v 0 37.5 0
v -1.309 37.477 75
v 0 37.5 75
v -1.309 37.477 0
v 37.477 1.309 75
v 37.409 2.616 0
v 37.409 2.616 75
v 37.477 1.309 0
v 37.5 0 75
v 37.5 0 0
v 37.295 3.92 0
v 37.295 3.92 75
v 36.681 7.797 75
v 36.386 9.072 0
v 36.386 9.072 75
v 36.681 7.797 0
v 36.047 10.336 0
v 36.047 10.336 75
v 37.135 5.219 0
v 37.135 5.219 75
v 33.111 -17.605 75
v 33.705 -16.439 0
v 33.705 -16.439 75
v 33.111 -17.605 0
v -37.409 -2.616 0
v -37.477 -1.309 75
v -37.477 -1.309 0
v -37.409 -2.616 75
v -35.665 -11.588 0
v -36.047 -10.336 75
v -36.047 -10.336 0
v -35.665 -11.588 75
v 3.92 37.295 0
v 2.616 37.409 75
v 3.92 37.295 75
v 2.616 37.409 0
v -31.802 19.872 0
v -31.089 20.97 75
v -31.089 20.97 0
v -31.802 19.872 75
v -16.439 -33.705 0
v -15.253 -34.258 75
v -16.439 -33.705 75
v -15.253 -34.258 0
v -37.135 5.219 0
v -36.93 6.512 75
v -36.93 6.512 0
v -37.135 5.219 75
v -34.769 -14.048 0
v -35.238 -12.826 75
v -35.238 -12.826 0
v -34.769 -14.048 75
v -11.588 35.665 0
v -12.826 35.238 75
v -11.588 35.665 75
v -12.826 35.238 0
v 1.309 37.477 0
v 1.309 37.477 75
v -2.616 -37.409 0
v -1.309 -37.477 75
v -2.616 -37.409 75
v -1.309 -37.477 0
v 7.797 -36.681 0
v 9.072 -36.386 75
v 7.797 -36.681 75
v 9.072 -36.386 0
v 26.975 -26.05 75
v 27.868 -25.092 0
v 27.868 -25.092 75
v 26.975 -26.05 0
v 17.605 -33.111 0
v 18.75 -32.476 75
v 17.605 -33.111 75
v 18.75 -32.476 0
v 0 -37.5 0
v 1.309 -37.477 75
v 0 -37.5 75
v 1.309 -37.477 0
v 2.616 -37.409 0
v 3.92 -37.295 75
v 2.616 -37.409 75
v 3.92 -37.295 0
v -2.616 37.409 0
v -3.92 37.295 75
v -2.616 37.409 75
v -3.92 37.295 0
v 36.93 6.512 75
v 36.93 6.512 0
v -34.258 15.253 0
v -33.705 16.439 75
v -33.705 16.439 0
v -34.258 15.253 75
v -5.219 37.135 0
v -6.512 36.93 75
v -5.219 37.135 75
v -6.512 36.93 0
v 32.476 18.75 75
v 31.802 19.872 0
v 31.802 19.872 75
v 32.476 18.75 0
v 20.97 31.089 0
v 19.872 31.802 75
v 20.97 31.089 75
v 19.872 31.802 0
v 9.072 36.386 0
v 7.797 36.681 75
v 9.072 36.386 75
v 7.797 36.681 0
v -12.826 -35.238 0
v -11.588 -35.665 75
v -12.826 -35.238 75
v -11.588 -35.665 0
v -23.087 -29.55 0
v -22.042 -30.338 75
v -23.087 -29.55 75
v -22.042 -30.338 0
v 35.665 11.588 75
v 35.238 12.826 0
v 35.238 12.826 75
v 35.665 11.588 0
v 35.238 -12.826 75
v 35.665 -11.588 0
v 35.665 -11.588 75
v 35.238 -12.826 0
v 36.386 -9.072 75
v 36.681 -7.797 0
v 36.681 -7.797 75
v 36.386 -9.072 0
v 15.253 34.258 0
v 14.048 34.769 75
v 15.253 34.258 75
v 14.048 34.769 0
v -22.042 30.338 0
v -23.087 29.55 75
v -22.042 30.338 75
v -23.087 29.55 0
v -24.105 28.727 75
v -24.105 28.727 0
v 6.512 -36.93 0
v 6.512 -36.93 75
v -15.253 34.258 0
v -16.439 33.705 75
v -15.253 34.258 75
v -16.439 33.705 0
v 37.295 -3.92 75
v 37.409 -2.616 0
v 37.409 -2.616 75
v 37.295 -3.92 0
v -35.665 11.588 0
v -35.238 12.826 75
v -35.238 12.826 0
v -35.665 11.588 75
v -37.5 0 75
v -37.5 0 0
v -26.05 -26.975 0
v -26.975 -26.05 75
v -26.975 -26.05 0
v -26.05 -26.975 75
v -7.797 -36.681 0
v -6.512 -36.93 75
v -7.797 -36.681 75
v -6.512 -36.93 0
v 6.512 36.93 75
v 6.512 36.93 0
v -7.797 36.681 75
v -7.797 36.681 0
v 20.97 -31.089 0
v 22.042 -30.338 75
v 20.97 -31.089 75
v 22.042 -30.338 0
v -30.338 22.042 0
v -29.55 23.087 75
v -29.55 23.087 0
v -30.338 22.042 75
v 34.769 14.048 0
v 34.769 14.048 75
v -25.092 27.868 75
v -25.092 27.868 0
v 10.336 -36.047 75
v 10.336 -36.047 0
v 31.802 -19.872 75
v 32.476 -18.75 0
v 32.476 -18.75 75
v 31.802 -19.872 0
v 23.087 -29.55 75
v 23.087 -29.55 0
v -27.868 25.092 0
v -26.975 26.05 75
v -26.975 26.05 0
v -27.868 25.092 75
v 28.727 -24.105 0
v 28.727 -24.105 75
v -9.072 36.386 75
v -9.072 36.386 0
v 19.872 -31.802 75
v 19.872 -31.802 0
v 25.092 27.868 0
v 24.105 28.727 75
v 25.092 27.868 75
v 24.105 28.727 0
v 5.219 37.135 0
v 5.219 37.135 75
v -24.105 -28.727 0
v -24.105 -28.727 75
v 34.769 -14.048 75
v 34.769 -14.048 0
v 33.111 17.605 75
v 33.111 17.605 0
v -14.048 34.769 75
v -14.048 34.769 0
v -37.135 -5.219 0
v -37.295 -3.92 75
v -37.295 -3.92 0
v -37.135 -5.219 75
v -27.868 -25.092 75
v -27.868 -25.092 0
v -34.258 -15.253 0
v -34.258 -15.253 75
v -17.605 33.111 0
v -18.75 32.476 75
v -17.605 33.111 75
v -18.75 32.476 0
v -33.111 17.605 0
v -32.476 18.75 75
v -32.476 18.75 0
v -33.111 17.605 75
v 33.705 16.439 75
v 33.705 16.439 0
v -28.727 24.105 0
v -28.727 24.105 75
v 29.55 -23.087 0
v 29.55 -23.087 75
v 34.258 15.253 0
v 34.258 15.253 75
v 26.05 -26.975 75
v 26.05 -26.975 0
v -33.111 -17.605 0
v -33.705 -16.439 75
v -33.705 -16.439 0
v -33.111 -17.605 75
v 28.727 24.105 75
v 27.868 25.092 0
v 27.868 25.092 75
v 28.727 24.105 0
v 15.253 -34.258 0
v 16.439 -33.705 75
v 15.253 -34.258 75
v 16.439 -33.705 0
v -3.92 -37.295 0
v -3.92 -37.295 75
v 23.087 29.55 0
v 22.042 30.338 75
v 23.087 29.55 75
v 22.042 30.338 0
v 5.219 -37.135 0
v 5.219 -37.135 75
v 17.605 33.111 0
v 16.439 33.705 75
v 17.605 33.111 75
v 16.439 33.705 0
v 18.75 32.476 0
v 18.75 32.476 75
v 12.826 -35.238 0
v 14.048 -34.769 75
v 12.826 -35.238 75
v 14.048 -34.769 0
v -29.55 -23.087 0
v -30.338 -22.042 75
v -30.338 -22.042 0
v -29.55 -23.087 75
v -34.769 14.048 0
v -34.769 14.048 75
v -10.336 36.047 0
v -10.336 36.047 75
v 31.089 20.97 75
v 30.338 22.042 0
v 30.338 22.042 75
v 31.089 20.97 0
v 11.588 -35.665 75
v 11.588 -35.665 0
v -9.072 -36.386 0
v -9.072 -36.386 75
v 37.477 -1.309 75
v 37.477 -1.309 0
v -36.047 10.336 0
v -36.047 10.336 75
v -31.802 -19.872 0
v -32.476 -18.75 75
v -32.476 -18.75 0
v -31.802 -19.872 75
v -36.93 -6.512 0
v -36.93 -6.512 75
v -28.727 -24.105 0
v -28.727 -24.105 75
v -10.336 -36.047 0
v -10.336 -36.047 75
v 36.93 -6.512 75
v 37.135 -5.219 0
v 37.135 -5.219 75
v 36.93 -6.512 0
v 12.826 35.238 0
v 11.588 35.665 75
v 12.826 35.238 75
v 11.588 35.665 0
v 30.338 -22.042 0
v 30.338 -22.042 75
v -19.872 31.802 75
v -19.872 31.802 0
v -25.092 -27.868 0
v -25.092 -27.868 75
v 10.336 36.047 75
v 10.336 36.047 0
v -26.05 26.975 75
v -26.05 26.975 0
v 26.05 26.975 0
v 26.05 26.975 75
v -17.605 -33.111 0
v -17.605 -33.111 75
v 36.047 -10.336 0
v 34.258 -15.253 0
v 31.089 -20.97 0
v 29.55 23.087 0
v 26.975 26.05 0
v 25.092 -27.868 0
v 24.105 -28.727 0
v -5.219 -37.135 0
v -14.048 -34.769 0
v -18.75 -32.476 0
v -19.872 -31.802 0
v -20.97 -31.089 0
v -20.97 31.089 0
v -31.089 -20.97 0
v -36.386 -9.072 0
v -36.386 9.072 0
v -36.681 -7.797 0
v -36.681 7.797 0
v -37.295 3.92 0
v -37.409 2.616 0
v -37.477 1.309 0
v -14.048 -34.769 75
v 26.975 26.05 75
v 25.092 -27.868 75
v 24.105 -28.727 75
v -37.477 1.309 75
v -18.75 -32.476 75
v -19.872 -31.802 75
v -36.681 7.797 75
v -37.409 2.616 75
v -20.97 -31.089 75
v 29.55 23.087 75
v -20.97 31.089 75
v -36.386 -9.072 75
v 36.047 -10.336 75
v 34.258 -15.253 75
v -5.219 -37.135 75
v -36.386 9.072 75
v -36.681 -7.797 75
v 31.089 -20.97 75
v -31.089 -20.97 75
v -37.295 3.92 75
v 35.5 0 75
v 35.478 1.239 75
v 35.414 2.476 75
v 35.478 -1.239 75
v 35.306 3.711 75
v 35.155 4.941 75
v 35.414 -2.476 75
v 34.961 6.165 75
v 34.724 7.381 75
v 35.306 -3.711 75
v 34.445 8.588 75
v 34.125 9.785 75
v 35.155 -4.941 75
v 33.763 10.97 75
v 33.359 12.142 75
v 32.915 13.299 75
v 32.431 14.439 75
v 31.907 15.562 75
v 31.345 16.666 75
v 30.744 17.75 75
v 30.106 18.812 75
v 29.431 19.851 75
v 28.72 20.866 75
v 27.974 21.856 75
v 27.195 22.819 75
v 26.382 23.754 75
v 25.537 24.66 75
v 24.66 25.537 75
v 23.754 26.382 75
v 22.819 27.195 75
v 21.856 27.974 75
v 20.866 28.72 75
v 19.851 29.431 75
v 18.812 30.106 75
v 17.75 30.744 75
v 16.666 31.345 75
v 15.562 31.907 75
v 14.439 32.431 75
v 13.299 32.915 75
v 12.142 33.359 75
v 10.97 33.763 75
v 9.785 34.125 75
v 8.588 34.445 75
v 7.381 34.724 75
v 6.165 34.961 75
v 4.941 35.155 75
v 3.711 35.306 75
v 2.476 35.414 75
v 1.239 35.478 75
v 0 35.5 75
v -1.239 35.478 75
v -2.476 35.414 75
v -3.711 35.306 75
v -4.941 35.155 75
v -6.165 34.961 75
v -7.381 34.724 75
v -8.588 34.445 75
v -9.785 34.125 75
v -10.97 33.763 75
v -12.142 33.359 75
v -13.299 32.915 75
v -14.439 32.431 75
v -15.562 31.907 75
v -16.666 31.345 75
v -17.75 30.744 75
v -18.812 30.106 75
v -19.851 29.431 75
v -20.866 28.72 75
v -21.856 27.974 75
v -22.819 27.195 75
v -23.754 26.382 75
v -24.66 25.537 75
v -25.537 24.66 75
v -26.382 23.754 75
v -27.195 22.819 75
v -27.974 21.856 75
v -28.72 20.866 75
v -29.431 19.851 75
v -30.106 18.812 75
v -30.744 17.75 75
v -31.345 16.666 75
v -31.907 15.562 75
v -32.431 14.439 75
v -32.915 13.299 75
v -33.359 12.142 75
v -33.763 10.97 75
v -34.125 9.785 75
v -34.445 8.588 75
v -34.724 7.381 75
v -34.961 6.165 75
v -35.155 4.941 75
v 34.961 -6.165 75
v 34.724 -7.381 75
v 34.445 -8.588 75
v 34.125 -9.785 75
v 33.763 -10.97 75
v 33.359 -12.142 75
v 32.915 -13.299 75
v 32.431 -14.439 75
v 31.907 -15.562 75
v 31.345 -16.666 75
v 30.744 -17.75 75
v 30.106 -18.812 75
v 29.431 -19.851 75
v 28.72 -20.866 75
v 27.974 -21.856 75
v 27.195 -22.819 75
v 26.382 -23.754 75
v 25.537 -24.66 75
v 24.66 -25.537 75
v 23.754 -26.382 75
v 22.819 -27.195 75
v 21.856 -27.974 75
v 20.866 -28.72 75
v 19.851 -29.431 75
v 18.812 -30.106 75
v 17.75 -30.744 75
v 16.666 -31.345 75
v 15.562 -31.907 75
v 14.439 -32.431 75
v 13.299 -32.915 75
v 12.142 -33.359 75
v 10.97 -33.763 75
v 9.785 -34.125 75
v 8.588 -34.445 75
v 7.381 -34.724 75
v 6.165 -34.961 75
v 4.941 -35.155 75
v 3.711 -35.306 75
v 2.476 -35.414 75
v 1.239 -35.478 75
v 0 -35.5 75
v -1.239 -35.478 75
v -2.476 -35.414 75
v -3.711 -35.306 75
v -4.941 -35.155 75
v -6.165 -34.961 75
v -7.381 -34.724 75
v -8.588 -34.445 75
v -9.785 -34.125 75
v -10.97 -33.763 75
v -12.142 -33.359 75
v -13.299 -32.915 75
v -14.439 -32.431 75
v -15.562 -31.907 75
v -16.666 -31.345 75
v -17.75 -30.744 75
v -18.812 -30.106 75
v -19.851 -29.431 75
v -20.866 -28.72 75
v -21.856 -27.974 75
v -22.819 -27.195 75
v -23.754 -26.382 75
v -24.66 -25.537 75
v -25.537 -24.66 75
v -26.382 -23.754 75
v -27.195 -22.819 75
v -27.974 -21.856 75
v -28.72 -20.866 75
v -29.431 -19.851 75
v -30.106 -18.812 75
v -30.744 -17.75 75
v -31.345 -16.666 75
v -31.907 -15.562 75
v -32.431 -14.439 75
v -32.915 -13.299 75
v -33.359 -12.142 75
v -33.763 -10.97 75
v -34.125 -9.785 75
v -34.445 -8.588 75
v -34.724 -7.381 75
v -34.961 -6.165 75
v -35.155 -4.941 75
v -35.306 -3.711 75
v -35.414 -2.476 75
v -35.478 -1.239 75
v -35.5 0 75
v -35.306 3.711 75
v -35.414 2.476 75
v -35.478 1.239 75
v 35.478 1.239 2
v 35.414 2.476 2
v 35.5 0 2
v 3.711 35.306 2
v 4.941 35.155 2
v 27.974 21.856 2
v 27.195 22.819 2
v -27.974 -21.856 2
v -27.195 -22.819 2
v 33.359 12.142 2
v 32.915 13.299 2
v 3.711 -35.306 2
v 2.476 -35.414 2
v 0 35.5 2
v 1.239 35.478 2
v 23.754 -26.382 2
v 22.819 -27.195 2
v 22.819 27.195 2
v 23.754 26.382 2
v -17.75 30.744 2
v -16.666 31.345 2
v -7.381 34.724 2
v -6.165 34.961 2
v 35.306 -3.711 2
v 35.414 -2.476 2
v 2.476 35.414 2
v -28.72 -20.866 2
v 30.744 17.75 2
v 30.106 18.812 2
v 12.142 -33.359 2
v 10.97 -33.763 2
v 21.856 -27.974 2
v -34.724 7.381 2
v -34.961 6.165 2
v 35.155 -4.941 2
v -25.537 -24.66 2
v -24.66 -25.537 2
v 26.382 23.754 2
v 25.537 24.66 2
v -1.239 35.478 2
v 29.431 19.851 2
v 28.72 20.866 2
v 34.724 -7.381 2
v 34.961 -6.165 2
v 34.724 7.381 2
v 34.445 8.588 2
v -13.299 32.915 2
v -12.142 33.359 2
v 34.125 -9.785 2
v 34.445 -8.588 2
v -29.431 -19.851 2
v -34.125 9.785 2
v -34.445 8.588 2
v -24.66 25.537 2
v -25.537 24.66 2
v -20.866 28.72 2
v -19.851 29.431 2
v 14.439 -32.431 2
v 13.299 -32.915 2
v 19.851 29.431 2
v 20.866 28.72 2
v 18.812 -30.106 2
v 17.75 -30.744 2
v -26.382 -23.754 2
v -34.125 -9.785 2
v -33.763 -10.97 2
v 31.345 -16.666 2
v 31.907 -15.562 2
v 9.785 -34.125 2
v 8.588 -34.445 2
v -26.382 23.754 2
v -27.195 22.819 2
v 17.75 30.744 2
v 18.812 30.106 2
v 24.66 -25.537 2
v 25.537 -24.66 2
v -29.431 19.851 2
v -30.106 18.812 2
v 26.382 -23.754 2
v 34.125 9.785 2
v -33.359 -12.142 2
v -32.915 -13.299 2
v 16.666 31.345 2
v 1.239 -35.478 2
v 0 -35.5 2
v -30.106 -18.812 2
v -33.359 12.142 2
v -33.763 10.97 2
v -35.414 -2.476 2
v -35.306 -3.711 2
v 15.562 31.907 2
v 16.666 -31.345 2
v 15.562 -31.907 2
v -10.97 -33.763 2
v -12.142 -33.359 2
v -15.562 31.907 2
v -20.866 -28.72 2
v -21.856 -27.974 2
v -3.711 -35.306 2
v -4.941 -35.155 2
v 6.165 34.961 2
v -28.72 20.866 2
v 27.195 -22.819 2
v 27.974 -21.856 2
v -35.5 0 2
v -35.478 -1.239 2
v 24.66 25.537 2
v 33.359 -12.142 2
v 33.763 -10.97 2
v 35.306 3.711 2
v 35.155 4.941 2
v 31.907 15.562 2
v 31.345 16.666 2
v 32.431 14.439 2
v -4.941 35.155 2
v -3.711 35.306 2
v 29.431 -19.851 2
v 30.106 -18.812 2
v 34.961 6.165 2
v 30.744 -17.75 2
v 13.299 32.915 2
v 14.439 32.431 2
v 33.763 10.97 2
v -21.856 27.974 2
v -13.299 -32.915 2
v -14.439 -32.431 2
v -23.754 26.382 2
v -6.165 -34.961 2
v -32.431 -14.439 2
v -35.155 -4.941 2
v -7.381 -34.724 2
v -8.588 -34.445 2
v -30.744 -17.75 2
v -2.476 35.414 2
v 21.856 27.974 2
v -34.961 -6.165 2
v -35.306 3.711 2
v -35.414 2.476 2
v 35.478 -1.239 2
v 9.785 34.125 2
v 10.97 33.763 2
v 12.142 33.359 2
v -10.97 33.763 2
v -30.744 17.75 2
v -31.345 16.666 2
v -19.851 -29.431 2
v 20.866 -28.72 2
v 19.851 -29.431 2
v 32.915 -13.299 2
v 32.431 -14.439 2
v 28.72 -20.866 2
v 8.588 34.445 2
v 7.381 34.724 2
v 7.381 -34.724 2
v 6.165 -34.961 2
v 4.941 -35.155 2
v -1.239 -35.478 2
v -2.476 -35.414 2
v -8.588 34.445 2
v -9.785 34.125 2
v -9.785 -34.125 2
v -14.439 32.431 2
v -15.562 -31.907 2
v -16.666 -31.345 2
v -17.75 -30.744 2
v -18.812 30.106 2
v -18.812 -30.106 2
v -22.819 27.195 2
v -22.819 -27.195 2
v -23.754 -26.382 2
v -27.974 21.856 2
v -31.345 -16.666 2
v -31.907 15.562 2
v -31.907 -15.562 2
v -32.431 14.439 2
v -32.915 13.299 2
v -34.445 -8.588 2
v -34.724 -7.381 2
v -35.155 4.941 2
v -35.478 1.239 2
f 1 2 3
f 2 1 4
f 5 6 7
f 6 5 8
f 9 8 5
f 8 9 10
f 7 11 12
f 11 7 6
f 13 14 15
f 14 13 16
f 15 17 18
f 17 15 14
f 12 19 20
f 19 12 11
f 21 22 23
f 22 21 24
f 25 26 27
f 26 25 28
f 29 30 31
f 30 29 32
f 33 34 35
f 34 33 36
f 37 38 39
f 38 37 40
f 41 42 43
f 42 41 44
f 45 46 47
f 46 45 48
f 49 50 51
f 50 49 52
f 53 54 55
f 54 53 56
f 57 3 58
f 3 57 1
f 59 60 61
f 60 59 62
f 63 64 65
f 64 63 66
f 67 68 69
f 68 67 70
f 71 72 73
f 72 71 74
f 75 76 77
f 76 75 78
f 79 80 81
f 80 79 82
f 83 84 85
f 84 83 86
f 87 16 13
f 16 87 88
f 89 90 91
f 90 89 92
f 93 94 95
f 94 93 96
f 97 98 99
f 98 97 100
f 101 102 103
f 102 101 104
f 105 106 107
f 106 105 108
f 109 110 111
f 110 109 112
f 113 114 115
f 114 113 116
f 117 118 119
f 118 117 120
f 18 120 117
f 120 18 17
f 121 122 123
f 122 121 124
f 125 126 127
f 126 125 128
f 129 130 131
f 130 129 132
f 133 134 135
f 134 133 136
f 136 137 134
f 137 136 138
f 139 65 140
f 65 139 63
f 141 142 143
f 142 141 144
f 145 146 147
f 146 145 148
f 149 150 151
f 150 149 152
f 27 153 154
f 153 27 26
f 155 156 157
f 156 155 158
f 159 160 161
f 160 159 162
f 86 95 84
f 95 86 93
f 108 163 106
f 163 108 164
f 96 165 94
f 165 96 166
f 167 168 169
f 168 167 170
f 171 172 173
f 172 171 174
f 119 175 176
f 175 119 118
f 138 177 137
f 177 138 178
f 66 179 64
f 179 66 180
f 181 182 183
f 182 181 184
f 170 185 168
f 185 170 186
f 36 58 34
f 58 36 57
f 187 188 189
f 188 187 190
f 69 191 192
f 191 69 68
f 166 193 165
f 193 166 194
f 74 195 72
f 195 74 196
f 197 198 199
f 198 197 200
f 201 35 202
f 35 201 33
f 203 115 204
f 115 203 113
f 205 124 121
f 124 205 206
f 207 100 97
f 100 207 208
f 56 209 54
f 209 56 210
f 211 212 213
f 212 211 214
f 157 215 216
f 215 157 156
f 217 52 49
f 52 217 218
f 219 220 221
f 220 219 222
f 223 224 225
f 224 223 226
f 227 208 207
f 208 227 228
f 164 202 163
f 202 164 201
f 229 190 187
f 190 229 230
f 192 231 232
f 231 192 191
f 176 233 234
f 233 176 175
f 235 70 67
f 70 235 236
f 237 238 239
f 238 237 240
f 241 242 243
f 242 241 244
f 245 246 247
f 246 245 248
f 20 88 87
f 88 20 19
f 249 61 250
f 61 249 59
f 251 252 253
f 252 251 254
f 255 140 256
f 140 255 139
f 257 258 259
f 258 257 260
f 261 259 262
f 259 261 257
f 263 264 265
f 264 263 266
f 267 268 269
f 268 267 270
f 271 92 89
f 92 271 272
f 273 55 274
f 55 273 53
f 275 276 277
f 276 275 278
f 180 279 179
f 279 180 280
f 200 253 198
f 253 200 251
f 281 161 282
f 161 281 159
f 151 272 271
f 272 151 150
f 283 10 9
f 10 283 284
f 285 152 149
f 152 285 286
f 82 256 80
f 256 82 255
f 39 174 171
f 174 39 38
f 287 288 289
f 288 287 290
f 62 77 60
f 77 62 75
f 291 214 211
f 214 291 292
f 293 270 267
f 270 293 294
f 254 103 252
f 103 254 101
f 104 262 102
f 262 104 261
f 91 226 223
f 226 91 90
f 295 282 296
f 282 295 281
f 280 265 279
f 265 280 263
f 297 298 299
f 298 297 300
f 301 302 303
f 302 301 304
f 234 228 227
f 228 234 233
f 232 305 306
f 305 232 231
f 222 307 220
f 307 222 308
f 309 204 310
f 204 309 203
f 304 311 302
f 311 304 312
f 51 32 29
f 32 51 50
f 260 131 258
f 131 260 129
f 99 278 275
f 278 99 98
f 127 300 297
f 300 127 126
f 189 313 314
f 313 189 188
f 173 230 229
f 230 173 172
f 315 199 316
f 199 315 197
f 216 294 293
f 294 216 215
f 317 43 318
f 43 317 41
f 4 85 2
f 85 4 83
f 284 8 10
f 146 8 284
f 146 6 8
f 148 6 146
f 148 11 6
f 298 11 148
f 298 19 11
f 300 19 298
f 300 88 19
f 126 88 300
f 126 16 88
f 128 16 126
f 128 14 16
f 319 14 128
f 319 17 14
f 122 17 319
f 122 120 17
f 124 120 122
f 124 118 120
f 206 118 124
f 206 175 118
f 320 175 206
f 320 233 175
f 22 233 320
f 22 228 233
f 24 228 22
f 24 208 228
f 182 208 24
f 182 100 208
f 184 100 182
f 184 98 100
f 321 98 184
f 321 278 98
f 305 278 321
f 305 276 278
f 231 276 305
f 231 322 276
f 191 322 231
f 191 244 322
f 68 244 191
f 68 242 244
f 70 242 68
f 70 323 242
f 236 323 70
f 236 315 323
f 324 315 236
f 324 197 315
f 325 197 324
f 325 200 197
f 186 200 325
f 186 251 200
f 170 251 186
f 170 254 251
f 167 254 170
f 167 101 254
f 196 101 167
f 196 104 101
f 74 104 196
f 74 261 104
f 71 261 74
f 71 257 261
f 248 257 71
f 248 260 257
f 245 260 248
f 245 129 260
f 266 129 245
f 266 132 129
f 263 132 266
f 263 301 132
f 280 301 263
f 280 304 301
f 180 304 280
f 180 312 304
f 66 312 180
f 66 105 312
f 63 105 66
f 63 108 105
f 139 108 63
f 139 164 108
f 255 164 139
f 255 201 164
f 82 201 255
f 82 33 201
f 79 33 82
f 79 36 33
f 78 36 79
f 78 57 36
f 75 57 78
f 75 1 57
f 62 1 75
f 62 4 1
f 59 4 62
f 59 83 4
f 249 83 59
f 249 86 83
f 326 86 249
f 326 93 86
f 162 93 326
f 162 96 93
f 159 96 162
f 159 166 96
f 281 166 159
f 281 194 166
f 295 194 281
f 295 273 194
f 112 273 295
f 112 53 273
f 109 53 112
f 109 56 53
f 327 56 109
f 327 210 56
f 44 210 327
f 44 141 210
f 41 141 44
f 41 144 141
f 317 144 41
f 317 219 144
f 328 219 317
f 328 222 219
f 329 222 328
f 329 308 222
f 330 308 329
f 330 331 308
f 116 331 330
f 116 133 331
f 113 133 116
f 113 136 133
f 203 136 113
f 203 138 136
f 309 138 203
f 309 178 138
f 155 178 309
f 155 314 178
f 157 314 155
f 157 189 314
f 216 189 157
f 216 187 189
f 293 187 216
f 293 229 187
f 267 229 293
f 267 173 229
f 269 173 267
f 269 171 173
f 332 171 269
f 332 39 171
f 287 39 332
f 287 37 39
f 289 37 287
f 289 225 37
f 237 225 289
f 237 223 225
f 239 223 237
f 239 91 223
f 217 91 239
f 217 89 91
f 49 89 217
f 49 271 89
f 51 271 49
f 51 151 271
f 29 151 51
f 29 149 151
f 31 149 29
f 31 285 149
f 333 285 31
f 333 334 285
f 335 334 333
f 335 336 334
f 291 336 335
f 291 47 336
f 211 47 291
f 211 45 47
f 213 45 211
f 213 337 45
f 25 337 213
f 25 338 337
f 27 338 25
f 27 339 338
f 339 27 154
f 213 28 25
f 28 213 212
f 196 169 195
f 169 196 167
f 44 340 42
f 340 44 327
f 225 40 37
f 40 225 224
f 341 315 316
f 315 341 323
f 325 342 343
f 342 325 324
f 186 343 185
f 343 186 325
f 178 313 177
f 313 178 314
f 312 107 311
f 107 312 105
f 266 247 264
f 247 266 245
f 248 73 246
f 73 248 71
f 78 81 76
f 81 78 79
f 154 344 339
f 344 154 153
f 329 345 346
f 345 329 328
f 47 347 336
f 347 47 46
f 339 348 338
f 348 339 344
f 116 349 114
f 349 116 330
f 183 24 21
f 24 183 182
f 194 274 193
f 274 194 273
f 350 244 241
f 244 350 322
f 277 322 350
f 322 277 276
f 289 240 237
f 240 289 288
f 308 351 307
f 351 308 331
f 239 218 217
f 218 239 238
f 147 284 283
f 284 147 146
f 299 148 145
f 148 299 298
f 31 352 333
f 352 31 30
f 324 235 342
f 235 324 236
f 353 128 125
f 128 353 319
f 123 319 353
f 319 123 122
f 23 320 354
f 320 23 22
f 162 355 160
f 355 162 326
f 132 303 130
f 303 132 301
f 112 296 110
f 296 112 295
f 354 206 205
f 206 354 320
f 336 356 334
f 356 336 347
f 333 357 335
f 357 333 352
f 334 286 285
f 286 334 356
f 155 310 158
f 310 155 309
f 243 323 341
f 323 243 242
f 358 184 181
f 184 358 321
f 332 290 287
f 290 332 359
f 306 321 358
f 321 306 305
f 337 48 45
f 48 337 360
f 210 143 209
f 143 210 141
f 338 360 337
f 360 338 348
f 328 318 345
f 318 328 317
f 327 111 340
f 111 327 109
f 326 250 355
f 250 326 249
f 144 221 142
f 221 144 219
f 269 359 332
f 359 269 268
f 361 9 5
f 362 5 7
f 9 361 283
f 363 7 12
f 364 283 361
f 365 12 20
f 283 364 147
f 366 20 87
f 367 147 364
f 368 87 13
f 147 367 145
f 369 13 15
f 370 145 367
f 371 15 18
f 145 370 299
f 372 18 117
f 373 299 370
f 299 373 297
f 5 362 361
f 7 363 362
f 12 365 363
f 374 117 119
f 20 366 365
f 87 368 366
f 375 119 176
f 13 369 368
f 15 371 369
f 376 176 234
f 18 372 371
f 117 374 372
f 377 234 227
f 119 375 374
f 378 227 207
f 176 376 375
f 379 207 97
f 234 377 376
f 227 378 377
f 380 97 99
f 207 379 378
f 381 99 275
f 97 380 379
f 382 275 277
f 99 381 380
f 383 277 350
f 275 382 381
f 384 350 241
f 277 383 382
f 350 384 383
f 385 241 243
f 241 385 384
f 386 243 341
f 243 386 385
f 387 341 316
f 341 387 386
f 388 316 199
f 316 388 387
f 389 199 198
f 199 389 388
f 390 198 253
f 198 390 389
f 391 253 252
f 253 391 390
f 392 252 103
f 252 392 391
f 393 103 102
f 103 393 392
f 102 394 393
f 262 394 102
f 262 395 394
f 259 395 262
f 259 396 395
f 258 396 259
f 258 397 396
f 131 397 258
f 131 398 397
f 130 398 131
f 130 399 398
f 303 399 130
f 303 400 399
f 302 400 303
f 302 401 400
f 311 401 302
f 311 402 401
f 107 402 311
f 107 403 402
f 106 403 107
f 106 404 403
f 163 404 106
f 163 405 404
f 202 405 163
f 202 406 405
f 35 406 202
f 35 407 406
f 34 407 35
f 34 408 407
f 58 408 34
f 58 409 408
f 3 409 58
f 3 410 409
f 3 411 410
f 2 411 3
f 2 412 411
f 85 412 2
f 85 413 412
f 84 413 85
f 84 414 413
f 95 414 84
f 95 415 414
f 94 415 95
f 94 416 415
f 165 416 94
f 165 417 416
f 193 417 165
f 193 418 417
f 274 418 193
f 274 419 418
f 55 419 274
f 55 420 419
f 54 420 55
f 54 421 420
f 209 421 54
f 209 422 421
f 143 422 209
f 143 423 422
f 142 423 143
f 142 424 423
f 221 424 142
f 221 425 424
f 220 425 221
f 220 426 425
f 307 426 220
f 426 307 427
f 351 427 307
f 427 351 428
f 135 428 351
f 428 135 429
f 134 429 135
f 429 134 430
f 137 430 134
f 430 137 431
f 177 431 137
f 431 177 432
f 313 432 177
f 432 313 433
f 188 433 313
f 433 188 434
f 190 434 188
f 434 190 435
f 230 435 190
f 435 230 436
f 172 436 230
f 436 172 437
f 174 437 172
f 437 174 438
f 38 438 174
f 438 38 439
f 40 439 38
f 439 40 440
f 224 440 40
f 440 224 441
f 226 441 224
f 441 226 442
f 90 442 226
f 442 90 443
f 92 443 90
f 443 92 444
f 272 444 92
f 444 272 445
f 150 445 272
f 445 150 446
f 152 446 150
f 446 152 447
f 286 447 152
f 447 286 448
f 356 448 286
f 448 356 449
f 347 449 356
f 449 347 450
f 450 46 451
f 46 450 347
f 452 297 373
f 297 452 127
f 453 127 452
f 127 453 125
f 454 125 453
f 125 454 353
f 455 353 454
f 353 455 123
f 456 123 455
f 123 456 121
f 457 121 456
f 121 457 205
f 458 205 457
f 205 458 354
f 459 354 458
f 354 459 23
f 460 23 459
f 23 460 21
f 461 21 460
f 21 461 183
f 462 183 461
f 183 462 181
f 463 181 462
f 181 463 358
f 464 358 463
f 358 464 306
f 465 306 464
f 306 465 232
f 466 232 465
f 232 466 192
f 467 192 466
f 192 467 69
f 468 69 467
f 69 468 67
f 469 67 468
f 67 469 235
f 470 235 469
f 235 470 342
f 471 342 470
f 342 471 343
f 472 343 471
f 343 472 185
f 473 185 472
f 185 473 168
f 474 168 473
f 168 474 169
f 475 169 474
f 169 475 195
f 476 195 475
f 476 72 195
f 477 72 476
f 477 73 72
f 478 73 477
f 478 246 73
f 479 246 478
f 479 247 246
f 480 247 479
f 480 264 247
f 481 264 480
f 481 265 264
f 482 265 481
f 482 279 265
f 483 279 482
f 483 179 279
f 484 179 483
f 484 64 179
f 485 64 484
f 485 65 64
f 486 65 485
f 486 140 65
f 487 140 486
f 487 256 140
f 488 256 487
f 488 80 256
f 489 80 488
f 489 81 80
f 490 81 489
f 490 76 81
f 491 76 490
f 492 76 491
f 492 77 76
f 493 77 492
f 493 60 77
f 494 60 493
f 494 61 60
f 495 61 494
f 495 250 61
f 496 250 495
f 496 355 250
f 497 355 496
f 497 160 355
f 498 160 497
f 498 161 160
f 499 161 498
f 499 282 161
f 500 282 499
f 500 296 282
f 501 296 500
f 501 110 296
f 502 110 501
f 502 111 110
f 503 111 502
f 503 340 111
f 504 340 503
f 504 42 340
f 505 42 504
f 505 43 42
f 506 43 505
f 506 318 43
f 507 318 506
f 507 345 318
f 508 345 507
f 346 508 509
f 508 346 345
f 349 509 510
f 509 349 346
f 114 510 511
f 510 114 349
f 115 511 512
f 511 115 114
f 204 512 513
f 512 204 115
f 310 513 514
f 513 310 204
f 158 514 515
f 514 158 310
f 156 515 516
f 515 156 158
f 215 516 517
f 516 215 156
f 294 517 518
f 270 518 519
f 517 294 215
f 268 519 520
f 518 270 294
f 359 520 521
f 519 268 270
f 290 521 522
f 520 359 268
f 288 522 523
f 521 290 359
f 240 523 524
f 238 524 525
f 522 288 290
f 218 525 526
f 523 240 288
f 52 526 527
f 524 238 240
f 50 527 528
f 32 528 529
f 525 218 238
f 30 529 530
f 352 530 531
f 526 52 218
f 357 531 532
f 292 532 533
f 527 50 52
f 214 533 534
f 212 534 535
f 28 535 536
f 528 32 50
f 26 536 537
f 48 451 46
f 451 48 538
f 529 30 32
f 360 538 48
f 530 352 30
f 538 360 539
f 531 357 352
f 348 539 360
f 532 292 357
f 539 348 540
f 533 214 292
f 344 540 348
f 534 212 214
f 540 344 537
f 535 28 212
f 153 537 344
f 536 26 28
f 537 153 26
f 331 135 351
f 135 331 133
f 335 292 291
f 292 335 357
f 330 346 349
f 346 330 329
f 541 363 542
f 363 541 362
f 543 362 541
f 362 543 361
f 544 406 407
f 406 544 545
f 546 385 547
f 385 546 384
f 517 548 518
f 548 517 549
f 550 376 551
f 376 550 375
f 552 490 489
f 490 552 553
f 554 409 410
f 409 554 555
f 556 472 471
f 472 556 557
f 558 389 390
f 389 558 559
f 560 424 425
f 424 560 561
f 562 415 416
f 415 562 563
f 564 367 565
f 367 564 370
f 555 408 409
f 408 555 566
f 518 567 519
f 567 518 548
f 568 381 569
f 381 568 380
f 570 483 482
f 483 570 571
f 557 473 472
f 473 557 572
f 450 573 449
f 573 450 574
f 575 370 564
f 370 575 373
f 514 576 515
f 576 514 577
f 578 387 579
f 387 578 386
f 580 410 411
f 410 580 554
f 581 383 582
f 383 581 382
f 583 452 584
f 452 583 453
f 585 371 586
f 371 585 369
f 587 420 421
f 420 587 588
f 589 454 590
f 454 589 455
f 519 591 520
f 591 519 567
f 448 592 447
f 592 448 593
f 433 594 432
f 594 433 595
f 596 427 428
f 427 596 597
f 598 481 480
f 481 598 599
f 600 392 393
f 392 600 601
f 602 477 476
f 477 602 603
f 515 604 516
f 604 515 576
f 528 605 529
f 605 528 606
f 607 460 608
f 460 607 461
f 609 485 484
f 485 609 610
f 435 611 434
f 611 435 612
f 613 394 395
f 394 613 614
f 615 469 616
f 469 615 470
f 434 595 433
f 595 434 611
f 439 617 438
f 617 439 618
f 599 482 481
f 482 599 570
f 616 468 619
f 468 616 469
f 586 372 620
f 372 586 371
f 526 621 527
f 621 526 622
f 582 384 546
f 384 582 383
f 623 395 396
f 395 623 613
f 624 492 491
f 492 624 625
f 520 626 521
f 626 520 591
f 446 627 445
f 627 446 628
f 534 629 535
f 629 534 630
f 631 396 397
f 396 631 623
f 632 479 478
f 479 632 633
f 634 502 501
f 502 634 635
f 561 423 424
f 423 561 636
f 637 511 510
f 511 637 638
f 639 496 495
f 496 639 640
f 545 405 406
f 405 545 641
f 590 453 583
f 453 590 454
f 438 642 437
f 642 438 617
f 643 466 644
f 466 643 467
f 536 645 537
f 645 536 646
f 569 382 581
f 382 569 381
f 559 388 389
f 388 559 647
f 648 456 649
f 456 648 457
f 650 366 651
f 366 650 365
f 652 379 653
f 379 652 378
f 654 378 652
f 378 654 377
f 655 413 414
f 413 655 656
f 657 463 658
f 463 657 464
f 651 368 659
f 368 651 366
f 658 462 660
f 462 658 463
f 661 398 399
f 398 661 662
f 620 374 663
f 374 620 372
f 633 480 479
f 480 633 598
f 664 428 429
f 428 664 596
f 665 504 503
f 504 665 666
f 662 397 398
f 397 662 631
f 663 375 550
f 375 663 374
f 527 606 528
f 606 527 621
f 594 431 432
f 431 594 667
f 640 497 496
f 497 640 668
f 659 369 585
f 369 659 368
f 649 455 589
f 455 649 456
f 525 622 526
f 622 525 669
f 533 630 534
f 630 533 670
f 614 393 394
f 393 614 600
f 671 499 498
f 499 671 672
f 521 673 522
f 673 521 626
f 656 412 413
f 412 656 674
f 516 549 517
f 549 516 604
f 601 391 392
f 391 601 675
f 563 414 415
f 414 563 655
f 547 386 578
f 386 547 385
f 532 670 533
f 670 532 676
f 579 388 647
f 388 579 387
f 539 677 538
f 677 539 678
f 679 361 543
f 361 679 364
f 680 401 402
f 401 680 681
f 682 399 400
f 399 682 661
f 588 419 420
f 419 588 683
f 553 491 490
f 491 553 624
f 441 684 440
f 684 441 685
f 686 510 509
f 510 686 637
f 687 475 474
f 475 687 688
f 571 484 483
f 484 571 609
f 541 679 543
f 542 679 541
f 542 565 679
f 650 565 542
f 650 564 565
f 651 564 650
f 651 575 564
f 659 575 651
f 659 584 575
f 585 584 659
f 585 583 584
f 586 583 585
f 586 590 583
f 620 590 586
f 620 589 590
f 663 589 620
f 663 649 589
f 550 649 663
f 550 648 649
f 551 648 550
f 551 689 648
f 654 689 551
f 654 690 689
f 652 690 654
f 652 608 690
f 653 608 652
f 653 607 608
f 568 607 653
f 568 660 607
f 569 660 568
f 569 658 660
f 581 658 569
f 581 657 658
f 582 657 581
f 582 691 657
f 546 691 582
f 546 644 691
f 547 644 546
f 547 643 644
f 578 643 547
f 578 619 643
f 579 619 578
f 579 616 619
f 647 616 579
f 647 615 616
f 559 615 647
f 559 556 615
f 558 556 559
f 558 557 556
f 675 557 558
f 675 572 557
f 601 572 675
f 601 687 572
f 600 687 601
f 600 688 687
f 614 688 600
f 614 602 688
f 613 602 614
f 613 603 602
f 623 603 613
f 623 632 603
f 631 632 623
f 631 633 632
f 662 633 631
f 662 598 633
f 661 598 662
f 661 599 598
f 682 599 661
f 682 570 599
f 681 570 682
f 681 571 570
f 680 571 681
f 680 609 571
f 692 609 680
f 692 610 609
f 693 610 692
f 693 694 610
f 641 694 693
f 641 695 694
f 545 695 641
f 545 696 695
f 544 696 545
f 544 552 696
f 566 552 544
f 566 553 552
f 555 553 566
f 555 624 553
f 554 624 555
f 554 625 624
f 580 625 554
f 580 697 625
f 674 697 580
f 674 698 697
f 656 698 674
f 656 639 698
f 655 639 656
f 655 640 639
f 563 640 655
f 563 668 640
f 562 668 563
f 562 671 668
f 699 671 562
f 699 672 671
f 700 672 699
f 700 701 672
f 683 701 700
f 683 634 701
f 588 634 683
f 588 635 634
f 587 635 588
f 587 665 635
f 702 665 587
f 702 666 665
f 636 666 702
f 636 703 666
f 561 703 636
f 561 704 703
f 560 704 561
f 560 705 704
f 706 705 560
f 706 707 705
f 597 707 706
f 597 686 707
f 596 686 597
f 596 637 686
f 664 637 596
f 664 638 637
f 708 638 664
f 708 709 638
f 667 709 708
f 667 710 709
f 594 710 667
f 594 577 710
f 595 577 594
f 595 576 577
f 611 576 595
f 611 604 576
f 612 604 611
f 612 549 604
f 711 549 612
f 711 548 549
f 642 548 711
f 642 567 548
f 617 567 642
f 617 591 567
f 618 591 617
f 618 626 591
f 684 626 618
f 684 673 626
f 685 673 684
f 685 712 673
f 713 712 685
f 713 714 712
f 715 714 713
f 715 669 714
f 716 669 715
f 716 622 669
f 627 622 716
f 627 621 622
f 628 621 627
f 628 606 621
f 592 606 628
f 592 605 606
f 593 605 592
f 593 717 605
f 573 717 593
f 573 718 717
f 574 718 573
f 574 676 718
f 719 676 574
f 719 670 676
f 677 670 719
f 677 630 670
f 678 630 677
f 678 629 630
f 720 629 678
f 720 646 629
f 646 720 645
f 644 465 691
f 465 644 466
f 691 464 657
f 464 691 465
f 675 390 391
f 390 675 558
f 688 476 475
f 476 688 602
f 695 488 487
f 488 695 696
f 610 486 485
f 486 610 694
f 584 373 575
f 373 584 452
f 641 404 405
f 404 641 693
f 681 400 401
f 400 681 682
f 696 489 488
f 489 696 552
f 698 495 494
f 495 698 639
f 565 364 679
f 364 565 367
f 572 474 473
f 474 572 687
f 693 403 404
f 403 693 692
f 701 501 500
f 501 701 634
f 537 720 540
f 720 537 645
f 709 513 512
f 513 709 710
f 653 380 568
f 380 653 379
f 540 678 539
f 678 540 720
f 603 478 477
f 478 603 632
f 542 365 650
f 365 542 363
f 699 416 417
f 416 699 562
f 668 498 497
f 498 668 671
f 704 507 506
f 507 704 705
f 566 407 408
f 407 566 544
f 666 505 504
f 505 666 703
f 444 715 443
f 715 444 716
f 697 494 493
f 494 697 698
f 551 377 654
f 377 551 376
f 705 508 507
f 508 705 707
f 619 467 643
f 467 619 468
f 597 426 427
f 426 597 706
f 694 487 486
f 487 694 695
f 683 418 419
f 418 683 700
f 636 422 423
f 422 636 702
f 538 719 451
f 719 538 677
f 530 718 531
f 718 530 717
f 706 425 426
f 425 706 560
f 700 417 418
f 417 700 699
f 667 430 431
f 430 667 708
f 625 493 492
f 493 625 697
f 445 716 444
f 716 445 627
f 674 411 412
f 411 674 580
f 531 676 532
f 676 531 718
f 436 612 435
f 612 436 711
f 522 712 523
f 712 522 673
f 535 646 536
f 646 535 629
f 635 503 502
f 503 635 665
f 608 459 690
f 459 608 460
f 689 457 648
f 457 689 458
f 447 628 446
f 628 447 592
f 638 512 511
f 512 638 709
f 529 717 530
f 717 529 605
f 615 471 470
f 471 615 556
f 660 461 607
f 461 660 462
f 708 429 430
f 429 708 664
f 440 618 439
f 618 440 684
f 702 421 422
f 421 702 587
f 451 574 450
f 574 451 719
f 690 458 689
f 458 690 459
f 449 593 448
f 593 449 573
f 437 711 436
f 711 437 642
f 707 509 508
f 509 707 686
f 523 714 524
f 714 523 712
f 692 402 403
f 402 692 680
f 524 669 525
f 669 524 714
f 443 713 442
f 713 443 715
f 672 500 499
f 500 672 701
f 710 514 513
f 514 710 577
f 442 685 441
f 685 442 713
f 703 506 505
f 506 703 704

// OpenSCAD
$fn=180;

// Diameter of the cup.
diameter=75;
// Height of the cup.
height=75;
// Height of the ring.
thickness=2;
// Small margin to (not) connect elements.
margin=0.01;

difference() {
    color("black")
        cylinder(h=height, d=diameter);
    translate([0, 0, thickness])
        cylinder(h=height - thickness + margin, d=diameter - 2 * thickness);
}
